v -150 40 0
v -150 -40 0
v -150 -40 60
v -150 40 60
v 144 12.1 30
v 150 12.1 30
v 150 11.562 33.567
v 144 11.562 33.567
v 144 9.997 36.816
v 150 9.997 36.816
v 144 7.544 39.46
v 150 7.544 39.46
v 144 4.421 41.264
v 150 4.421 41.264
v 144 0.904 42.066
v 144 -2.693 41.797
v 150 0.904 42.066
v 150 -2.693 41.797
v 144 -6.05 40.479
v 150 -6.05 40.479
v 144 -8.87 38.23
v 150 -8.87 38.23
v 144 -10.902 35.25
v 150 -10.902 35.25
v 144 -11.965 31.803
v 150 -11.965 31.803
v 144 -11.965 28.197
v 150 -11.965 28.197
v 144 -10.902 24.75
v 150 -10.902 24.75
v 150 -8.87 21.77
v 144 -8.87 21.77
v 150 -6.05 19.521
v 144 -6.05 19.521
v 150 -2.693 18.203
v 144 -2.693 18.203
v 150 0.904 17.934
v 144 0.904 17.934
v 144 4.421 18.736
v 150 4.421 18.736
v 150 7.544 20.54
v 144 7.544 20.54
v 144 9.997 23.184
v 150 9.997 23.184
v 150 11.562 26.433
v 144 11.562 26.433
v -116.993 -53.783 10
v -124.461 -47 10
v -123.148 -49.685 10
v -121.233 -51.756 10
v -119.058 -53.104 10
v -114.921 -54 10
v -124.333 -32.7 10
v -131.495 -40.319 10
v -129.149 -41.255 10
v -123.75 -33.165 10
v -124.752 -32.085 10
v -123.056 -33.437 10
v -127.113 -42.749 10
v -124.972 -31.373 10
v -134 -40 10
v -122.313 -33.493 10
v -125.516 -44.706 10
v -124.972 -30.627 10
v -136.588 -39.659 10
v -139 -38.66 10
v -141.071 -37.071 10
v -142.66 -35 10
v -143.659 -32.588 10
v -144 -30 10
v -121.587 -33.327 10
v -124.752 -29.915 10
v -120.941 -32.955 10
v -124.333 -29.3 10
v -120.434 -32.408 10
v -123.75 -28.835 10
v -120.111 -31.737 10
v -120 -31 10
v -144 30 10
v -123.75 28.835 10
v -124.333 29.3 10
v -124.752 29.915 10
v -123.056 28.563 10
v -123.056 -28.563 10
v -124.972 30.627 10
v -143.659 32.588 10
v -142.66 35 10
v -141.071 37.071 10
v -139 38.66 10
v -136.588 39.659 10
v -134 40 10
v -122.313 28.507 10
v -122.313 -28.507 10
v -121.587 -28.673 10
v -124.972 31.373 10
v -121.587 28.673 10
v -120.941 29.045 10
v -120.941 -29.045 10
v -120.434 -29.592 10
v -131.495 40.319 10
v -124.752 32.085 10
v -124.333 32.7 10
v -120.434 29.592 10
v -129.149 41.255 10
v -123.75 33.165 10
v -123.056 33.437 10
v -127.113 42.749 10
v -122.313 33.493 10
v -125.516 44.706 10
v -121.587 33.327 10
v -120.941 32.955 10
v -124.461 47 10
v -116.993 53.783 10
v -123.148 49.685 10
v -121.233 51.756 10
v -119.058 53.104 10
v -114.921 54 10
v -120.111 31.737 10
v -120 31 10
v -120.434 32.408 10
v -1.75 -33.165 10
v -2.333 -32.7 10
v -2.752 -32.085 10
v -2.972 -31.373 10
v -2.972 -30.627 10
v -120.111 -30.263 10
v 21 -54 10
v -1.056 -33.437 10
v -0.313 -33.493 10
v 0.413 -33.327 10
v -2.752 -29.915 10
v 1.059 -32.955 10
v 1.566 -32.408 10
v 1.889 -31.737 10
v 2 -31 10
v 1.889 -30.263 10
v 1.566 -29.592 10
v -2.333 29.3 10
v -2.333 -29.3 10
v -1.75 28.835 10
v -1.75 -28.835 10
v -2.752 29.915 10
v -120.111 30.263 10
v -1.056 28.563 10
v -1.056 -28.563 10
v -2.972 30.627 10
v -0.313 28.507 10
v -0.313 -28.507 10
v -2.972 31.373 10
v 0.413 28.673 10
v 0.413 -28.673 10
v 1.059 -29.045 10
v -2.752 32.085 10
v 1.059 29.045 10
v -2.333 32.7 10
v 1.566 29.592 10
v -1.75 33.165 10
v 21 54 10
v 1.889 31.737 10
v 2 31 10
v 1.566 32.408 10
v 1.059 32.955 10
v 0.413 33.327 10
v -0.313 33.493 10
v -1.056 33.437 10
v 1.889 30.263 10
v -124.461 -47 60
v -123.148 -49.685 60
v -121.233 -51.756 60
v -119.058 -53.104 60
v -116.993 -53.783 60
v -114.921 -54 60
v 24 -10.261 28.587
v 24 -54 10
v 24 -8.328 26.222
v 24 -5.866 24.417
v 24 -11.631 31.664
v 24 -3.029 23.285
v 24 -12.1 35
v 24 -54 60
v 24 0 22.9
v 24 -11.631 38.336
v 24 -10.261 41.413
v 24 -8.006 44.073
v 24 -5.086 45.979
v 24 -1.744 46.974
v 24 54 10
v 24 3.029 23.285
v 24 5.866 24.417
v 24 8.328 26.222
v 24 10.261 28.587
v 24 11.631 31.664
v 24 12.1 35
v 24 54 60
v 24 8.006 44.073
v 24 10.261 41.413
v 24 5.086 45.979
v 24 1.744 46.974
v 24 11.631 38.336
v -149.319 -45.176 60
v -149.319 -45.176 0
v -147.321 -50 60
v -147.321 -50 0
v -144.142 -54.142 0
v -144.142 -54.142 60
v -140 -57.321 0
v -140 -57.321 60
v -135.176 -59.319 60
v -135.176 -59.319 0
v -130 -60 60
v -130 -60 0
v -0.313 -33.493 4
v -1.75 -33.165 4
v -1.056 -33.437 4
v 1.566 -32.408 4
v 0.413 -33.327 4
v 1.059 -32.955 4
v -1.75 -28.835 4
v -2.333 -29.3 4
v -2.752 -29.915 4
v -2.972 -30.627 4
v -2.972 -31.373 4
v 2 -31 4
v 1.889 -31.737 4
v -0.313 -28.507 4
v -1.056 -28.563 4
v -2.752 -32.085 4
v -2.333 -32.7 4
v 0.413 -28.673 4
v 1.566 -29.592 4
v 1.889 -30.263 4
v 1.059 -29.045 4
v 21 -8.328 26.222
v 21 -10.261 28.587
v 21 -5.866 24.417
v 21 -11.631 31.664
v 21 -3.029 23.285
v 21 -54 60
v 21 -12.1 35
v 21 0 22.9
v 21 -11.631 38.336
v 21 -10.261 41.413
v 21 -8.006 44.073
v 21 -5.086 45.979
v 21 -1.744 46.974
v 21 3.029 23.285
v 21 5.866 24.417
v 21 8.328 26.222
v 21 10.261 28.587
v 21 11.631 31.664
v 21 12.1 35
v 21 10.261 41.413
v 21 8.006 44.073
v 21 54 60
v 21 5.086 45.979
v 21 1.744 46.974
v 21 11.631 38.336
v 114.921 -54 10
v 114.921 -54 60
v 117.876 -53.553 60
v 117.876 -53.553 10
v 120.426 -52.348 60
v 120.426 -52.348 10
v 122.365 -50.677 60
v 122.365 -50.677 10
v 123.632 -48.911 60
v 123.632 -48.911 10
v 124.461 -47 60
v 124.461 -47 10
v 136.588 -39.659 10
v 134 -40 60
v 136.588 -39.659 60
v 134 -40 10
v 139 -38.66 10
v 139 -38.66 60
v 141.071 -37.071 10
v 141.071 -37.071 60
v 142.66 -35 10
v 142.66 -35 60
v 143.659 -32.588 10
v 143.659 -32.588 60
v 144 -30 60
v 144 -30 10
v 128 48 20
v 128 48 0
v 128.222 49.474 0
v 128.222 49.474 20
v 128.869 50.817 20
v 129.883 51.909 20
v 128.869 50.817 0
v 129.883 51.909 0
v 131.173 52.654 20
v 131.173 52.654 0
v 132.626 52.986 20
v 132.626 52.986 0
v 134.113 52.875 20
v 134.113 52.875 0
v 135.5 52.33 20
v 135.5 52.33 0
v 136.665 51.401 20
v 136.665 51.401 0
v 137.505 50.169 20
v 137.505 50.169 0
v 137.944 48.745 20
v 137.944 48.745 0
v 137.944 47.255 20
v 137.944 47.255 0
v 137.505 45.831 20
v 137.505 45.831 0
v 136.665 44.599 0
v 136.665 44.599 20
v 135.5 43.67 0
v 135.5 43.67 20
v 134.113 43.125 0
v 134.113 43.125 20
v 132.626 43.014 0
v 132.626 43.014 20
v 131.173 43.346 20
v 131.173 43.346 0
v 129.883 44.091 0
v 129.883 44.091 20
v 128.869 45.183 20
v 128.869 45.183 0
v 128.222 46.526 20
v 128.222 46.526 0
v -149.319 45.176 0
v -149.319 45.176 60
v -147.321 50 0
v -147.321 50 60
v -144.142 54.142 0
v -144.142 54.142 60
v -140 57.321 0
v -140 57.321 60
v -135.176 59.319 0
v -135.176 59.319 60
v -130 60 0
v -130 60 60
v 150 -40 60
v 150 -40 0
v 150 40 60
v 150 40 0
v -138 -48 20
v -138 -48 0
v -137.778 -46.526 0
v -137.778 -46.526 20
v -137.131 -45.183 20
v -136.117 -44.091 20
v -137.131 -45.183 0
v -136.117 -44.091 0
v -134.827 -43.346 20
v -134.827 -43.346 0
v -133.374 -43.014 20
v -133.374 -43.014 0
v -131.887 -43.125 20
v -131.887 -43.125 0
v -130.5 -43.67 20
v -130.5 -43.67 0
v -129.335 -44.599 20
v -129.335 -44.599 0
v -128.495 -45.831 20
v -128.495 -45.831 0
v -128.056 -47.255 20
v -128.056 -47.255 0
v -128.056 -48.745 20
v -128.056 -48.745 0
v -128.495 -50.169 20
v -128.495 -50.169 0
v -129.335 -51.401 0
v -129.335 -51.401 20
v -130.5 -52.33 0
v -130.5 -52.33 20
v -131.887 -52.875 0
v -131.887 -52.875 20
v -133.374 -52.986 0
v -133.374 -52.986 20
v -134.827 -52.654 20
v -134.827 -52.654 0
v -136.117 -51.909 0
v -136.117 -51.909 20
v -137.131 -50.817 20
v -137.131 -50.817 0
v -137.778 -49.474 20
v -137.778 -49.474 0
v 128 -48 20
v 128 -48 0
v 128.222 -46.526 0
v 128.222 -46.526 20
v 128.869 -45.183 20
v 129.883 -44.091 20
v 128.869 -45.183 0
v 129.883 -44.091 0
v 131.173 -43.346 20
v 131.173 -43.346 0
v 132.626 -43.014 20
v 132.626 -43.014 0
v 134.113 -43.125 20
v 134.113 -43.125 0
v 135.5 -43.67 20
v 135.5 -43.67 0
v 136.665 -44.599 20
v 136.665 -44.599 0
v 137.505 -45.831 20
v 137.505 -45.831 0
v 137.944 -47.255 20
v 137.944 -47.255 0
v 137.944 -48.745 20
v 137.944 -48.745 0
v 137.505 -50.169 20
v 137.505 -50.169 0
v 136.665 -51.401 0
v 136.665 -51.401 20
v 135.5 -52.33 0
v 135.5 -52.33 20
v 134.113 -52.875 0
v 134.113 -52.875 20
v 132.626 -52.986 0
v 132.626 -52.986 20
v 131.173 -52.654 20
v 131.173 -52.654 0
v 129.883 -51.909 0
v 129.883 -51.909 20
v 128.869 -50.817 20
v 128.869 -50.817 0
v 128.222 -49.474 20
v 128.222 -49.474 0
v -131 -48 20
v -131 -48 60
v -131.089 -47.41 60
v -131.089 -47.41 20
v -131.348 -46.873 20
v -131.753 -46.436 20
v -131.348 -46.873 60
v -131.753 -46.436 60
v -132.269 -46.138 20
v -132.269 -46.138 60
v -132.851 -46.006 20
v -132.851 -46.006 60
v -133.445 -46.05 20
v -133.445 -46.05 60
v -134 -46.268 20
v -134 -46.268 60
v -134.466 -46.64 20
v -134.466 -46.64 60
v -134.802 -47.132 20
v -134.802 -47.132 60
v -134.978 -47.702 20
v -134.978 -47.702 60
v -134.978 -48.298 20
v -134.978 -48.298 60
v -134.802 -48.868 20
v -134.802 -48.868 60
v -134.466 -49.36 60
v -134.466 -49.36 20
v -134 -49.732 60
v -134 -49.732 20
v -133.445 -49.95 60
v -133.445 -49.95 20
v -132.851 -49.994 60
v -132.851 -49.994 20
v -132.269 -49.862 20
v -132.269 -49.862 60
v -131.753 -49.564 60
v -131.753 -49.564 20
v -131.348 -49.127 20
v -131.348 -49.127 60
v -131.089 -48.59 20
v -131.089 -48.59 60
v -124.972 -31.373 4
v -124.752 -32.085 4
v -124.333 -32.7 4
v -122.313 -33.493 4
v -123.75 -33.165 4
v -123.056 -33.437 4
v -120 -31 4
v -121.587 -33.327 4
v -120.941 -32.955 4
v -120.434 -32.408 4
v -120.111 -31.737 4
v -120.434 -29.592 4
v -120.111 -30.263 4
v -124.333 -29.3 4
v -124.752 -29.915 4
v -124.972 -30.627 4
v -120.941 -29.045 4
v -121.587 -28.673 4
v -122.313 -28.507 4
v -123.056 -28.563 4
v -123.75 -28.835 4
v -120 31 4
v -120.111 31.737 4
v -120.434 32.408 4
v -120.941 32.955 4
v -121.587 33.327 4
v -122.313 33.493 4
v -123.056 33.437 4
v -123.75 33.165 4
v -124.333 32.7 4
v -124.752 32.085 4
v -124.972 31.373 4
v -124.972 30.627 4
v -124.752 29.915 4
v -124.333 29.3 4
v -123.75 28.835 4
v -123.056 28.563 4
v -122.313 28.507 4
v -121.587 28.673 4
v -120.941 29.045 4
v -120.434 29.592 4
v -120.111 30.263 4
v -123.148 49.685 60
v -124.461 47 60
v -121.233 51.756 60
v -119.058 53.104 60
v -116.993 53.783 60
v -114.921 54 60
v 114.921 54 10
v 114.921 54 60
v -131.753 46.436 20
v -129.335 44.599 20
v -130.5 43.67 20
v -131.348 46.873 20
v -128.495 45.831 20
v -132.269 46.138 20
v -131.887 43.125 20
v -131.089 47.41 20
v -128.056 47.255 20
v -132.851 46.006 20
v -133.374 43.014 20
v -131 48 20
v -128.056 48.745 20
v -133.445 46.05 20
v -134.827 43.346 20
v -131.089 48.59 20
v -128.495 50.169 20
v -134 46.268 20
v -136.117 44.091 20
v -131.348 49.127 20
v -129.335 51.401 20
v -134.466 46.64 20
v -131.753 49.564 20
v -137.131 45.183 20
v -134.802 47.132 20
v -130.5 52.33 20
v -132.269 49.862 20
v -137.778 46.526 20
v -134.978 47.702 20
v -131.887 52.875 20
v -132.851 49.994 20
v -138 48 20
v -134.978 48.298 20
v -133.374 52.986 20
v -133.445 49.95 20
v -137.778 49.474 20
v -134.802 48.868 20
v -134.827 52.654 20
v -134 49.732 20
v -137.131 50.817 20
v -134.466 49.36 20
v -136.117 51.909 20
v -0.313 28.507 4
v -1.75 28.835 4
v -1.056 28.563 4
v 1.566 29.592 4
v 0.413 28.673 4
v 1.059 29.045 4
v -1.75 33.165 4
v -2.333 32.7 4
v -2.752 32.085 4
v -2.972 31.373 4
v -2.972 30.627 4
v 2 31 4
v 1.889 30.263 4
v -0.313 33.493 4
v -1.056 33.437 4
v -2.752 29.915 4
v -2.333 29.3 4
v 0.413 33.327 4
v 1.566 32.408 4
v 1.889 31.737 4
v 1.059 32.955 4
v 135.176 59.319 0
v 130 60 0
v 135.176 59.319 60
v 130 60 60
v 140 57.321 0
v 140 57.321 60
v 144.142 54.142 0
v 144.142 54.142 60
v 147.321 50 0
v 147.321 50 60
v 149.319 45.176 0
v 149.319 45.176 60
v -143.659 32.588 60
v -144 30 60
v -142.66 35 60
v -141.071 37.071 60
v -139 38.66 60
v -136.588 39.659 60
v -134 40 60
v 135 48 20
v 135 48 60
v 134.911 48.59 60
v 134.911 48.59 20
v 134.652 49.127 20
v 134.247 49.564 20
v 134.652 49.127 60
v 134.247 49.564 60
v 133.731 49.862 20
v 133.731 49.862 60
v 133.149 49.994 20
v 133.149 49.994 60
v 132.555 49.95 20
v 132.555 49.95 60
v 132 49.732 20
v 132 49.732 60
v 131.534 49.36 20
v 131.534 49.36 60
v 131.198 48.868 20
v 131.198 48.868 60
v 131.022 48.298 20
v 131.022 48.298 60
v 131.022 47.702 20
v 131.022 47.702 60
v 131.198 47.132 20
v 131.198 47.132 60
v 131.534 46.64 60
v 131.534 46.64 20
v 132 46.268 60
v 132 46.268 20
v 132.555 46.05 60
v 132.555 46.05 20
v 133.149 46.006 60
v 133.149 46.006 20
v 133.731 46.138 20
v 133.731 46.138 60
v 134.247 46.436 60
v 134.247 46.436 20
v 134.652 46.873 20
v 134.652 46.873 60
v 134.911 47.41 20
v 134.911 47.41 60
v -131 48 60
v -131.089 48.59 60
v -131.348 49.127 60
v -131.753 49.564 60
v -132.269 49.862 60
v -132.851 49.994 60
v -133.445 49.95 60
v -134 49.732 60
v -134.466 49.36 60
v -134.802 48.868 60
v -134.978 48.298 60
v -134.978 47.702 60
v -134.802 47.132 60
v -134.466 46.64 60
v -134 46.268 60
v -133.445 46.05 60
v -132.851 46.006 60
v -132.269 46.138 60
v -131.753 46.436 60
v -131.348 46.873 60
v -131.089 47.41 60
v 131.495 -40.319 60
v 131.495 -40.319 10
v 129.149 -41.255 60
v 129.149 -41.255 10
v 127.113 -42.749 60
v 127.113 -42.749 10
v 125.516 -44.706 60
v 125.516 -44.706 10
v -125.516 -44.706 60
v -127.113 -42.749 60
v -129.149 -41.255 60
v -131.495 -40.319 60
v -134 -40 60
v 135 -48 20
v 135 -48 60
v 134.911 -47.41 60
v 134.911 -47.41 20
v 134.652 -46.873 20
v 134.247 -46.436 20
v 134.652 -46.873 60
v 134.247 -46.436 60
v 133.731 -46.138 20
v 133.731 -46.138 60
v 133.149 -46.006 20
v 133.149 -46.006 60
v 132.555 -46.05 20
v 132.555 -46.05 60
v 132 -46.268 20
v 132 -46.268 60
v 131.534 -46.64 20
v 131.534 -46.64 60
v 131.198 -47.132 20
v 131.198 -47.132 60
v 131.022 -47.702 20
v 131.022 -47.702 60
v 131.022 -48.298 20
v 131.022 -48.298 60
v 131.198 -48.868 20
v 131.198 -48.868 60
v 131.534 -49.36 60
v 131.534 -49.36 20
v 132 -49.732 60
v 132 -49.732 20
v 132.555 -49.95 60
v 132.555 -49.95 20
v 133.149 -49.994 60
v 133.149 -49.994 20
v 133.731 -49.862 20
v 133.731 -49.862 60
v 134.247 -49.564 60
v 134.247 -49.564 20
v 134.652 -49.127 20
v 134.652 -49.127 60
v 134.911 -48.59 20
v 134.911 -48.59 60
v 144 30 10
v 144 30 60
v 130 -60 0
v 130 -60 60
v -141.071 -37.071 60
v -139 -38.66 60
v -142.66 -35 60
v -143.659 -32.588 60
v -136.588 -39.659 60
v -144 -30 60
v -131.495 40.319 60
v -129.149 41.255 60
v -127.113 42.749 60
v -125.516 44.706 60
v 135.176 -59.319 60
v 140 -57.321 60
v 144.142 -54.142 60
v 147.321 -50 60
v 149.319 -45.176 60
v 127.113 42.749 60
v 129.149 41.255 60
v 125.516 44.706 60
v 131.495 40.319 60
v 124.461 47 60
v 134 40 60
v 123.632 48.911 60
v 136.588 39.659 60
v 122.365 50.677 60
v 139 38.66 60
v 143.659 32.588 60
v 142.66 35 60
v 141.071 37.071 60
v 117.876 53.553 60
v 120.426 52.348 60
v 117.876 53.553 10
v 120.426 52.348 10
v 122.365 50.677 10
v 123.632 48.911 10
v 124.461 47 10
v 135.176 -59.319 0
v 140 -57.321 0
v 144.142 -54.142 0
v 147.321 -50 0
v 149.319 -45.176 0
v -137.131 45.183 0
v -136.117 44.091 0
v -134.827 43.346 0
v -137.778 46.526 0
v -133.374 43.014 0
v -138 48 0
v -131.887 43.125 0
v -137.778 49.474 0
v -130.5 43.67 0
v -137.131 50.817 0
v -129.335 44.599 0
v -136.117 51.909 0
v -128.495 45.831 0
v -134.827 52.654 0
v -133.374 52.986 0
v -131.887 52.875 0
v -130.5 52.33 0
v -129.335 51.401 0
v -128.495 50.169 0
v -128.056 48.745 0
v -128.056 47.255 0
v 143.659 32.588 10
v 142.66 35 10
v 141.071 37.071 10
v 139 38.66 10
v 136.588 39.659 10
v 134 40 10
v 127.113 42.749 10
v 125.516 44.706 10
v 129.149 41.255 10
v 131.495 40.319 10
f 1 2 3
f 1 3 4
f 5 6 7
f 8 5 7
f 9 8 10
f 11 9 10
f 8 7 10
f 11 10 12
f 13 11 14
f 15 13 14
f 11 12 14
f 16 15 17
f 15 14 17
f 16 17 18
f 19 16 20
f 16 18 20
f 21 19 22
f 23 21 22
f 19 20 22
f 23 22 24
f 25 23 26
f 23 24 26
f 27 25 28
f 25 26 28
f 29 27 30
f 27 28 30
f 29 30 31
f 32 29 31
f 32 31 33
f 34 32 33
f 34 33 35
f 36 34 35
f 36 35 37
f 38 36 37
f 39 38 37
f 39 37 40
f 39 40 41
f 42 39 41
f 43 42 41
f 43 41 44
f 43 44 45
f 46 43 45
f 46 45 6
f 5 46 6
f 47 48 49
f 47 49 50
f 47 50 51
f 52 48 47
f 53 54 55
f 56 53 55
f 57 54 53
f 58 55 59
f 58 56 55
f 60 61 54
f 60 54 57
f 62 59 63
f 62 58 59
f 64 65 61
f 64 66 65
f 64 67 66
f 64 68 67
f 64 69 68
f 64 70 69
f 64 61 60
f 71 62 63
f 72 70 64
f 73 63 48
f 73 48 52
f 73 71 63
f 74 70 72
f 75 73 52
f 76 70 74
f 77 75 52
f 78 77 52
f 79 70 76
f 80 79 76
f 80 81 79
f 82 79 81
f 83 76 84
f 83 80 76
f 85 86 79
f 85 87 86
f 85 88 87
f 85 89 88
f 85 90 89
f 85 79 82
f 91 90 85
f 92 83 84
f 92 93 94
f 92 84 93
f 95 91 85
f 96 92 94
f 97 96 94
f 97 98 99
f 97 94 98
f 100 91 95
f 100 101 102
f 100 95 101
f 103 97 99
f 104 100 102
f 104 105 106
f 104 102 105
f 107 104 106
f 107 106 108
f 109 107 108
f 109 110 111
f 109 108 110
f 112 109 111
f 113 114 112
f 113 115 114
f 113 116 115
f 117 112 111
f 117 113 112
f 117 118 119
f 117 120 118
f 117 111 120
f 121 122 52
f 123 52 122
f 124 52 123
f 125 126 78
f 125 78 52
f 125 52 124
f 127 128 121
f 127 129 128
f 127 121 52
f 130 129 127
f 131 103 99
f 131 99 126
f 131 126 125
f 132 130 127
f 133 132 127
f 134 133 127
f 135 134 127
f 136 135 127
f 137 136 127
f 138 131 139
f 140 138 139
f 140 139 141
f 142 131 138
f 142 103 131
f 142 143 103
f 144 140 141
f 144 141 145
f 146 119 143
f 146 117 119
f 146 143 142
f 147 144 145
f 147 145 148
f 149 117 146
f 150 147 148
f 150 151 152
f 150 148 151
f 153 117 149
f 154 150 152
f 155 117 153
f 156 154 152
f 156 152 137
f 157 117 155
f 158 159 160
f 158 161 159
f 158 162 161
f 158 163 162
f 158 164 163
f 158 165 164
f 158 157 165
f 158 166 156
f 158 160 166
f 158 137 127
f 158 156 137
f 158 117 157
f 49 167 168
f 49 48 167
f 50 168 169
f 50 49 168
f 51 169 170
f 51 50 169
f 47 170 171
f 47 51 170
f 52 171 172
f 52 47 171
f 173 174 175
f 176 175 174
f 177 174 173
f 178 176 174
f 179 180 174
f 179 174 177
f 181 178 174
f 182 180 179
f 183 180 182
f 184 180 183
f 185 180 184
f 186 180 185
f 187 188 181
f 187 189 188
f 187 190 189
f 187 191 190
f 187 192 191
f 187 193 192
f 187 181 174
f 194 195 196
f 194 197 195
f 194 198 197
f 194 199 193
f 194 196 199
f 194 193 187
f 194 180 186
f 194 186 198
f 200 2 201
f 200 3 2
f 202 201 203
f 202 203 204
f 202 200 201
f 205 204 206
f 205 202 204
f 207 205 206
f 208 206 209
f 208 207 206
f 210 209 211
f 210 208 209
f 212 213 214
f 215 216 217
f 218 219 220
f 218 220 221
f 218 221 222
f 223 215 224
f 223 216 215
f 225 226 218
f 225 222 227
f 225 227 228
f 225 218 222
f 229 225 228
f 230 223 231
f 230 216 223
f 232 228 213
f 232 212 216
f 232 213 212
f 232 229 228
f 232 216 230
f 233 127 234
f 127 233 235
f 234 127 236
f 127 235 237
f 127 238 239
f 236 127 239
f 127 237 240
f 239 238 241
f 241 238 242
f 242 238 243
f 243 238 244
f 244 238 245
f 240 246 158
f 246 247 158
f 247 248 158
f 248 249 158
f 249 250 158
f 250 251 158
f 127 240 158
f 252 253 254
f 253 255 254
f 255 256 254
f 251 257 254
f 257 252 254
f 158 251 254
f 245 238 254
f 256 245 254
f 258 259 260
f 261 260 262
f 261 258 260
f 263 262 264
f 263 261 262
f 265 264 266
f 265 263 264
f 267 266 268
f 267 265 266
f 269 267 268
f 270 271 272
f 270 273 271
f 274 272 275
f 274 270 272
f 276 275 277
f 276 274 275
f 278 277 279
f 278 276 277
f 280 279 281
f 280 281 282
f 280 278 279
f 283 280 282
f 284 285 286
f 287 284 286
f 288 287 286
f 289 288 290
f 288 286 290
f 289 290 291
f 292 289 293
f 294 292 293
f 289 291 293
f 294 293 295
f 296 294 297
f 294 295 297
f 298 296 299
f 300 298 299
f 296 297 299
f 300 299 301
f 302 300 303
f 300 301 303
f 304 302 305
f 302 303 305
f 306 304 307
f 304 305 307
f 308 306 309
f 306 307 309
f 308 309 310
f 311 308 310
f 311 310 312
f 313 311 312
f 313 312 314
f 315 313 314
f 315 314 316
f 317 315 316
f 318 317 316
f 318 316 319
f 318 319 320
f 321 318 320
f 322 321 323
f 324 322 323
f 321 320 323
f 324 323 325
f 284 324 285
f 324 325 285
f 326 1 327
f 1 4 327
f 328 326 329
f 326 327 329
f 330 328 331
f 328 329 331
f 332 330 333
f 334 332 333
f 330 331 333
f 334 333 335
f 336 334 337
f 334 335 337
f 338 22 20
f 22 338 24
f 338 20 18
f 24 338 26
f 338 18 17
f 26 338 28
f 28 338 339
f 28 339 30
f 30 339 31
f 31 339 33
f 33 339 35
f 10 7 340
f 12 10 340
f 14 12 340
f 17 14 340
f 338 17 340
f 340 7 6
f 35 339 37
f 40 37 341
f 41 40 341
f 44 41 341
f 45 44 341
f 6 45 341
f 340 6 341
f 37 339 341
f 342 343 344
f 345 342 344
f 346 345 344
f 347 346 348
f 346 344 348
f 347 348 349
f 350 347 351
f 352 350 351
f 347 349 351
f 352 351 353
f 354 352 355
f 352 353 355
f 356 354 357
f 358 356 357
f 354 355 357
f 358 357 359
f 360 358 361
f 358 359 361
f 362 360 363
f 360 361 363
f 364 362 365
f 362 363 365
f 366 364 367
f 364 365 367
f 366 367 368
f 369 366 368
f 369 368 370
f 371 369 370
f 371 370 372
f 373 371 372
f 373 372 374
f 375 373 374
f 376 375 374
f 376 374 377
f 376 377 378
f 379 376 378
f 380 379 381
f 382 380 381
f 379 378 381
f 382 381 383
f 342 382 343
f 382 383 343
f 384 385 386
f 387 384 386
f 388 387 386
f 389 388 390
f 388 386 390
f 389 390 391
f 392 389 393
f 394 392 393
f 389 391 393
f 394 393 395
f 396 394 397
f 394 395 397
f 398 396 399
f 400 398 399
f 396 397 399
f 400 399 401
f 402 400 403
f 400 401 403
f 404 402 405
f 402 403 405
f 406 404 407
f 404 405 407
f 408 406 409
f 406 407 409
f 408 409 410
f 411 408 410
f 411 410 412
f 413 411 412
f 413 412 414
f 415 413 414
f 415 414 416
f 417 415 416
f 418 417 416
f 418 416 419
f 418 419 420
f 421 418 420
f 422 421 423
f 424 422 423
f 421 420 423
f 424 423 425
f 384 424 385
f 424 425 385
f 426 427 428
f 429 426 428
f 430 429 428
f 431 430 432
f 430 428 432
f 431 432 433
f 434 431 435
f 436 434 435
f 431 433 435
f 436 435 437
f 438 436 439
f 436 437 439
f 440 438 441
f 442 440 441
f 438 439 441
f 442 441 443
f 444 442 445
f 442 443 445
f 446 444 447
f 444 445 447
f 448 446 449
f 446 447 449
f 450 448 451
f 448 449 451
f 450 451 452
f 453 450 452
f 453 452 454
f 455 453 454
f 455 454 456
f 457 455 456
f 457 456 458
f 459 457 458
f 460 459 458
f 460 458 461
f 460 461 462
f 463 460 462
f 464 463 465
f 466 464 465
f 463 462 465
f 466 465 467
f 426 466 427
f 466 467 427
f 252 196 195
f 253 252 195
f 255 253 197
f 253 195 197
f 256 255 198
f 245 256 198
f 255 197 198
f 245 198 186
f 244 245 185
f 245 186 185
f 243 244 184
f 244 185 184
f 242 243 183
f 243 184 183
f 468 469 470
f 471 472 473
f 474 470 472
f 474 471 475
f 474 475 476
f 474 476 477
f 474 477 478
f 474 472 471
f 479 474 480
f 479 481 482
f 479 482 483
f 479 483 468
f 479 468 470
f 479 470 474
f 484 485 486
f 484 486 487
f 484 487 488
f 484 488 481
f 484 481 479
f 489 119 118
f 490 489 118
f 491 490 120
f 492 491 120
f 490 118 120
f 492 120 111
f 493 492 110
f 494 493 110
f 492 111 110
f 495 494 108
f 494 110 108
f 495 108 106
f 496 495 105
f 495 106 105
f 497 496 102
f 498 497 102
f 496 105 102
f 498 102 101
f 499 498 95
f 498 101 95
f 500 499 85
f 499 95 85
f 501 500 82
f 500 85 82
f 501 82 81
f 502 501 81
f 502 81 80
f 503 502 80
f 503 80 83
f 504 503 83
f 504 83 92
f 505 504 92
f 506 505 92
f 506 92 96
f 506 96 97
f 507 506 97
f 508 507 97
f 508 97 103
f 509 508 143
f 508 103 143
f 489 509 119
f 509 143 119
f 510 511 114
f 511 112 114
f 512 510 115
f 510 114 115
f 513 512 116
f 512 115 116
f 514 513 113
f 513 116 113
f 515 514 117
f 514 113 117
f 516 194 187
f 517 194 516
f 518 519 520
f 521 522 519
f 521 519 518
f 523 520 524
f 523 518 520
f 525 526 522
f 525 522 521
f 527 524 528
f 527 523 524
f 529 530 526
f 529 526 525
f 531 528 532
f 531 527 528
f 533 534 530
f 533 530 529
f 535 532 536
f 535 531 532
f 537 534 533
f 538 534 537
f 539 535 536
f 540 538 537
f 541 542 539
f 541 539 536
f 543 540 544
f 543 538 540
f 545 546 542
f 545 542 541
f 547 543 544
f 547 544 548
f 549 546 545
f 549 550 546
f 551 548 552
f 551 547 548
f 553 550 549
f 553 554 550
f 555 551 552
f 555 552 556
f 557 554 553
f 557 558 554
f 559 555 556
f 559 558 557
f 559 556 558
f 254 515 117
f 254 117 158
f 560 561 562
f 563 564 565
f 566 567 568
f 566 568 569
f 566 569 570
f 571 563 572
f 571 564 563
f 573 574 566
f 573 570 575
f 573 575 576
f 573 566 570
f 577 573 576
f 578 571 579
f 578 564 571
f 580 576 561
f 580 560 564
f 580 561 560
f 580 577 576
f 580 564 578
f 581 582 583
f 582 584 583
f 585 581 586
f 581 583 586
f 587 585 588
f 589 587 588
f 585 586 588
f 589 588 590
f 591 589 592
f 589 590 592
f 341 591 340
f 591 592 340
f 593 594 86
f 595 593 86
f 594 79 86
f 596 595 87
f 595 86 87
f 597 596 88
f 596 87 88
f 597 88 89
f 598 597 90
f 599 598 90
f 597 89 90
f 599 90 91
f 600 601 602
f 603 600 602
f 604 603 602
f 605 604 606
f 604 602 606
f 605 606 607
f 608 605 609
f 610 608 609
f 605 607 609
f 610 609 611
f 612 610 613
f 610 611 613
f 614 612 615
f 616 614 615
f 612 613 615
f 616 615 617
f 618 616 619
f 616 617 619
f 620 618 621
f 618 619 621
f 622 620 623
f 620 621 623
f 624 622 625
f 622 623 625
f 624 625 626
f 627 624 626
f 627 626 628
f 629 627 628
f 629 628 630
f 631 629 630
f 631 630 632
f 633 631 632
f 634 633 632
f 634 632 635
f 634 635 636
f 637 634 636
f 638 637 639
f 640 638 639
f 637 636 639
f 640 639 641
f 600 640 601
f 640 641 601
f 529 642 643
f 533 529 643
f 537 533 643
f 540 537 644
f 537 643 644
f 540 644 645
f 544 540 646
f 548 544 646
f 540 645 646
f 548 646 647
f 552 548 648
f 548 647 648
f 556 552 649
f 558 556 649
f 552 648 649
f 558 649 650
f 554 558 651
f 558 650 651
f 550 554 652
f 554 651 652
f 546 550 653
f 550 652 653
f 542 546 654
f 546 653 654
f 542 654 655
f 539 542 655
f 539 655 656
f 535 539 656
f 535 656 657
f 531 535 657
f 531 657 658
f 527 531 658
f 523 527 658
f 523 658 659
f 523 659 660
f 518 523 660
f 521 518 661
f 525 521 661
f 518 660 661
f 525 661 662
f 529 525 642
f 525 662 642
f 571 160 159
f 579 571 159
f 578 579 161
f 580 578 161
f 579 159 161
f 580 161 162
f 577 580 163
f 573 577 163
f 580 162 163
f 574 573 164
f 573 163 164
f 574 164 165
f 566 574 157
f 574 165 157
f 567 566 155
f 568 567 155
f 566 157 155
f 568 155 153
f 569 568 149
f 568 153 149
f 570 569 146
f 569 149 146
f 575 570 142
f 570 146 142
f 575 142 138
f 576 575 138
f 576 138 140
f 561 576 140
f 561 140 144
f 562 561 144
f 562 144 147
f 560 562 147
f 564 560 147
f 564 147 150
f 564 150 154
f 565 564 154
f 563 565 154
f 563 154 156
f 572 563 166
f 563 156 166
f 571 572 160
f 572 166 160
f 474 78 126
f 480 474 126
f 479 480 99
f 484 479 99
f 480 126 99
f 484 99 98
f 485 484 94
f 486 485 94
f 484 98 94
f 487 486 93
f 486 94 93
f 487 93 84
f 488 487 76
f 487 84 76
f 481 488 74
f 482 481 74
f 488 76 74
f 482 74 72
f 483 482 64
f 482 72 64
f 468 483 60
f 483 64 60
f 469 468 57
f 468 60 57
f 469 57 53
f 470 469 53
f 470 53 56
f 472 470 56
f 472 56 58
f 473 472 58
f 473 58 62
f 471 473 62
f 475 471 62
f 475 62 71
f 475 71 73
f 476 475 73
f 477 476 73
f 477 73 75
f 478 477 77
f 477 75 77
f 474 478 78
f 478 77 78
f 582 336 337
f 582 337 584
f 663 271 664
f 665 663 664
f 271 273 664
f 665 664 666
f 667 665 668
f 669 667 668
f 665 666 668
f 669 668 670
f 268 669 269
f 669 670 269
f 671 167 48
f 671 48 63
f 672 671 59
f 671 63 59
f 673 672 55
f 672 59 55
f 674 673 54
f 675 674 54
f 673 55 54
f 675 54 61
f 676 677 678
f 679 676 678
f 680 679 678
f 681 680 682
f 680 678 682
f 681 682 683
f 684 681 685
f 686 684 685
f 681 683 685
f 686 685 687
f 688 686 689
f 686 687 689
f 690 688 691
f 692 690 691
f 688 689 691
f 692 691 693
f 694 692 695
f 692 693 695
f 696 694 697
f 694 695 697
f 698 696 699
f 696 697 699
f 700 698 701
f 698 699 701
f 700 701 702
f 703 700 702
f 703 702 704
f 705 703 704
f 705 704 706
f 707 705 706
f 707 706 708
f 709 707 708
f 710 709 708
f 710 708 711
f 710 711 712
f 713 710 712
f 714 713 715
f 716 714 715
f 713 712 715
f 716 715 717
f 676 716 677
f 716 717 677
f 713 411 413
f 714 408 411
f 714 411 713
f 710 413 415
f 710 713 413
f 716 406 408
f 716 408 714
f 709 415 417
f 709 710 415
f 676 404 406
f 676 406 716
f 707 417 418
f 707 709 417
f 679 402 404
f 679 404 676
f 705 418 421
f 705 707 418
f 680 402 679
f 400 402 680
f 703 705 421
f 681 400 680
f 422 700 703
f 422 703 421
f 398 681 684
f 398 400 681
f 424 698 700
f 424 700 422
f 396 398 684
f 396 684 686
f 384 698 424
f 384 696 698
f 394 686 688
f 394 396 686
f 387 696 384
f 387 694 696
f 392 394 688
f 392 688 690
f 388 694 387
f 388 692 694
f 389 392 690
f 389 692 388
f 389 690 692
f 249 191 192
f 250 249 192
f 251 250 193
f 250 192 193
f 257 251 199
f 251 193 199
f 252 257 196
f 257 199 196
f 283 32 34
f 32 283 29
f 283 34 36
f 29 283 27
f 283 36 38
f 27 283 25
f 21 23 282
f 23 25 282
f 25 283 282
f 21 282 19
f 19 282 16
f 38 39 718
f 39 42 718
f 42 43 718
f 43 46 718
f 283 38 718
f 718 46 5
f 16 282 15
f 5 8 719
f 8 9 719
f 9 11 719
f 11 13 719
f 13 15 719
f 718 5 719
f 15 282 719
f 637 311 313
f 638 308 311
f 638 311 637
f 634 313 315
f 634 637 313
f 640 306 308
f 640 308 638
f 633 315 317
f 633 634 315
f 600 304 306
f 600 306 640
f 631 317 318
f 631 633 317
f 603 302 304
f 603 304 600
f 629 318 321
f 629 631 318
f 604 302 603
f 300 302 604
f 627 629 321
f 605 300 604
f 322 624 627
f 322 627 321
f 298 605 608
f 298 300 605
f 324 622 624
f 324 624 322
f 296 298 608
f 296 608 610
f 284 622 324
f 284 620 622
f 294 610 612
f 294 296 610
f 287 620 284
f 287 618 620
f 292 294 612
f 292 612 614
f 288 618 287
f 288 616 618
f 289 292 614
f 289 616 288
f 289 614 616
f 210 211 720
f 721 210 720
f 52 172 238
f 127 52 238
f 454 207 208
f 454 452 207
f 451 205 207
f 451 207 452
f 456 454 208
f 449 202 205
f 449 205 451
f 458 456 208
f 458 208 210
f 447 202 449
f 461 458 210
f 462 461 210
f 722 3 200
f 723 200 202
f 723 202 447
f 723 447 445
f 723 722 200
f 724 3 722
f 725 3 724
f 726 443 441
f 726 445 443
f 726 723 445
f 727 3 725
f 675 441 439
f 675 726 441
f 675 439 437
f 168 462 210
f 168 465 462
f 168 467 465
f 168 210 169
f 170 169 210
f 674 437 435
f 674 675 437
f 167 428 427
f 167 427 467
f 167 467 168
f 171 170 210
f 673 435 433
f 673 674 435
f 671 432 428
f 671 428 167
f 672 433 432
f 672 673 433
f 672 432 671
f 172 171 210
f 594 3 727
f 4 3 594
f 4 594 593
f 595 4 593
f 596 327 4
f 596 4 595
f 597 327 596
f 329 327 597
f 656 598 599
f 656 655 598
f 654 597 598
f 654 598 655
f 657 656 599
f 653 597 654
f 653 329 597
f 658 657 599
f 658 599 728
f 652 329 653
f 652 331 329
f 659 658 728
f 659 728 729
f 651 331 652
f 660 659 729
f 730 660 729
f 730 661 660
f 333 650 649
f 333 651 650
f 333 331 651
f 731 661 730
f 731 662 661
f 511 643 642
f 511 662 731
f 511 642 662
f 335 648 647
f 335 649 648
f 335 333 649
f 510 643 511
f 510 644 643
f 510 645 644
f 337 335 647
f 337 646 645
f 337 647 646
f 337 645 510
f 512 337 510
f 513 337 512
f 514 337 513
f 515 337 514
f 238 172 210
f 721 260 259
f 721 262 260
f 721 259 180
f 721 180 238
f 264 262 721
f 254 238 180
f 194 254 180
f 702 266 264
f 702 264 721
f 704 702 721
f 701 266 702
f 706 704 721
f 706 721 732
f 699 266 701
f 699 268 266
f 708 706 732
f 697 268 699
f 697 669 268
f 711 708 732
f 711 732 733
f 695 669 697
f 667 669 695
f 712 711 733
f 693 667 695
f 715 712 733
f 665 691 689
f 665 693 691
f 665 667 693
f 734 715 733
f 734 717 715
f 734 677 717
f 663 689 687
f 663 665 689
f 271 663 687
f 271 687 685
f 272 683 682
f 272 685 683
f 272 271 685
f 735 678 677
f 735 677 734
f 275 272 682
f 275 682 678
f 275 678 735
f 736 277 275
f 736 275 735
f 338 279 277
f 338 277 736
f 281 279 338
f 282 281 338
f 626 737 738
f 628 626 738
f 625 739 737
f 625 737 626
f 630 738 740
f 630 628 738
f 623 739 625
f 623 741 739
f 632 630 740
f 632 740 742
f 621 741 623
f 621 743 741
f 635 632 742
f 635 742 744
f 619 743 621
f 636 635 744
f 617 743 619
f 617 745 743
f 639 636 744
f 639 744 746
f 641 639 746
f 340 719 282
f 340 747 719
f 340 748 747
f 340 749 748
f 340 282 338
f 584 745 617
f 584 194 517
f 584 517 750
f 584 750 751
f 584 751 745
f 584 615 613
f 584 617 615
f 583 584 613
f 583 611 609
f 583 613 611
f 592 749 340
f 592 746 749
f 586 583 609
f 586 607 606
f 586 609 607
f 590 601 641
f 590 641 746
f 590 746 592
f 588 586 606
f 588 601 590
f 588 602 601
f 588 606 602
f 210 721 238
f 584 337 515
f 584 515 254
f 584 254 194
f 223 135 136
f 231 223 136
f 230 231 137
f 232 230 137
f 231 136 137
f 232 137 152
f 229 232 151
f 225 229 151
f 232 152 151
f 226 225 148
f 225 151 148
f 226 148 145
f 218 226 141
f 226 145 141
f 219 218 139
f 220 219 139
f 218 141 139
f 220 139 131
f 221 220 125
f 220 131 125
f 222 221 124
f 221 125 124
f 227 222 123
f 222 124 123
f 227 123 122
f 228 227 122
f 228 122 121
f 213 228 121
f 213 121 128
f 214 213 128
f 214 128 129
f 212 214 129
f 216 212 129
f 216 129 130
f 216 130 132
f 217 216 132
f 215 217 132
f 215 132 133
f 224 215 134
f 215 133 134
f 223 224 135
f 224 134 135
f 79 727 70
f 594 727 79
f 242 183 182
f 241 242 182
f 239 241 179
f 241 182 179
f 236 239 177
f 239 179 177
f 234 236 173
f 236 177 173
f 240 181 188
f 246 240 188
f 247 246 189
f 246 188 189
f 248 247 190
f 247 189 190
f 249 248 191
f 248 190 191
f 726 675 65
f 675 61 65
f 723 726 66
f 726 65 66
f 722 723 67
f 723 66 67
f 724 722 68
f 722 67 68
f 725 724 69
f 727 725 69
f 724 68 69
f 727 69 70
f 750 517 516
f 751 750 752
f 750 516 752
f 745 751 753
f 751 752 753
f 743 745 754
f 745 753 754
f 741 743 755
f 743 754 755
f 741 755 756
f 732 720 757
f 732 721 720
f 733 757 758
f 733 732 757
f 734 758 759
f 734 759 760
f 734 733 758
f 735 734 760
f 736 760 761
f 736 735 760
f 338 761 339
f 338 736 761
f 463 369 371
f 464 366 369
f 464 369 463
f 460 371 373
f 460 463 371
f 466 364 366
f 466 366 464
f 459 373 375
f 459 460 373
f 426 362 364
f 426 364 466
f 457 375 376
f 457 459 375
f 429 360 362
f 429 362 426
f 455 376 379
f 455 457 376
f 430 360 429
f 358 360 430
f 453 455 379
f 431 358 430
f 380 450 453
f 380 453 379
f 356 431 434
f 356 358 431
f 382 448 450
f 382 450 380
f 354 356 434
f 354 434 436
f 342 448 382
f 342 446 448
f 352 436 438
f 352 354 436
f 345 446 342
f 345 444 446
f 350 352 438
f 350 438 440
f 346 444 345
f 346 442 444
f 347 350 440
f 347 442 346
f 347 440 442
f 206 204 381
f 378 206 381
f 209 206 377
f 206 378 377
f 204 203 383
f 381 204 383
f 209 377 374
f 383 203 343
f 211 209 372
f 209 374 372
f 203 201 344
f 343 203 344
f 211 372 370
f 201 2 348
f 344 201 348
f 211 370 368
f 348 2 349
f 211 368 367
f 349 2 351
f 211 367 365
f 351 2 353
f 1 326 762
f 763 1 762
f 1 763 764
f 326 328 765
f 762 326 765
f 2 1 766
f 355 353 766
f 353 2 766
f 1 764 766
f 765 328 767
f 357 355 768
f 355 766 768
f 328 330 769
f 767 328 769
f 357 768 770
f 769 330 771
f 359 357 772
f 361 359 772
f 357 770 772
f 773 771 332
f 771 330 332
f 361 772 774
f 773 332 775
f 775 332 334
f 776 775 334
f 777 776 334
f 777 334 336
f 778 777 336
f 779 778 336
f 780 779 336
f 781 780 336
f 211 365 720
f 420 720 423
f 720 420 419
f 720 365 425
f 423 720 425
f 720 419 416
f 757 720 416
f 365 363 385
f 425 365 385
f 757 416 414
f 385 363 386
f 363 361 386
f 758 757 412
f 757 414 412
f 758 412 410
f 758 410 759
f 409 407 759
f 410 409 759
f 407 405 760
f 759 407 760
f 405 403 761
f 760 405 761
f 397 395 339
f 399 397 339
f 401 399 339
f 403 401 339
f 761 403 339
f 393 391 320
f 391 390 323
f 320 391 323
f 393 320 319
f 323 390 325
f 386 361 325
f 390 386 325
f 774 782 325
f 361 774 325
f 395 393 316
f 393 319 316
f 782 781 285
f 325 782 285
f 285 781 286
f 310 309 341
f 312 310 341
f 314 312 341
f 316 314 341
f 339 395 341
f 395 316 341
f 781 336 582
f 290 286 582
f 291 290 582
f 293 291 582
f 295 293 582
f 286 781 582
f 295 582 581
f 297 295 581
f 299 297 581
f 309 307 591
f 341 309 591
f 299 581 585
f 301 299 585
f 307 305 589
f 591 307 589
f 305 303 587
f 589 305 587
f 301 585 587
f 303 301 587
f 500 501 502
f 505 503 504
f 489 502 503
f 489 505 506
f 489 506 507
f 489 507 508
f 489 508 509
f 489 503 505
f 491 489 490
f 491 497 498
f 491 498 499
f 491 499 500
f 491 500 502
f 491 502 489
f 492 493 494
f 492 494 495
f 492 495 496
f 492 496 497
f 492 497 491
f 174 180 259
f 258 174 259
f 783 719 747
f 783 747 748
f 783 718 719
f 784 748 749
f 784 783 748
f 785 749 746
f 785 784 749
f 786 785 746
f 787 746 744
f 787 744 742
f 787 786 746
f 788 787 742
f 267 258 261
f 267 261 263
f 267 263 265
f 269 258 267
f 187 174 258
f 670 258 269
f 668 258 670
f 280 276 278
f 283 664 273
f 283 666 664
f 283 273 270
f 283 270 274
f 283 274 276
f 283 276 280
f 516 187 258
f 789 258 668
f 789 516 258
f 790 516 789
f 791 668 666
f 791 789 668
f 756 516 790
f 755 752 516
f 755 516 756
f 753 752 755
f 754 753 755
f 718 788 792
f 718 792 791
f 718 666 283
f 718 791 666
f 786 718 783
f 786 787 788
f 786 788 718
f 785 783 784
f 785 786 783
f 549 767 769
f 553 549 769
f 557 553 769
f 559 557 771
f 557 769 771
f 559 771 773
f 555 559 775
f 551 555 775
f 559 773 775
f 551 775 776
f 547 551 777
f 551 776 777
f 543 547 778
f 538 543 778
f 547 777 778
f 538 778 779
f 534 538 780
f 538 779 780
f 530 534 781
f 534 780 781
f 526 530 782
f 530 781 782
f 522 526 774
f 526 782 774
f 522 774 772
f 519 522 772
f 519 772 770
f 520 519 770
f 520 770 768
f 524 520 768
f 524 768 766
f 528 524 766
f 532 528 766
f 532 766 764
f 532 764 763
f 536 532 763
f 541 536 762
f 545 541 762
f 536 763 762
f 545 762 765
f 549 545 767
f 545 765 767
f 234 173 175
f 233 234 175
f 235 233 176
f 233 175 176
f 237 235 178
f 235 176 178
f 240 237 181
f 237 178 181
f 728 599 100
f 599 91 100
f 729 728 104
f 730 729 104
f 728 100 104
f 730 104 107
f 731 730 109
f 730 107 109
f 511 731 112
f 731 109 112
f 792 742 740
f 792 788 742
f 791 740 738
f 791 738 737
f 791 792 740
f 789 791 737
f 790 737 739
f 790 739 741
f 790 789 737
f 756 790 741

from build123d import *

# Parameters (mm, degrees)
SKETCH_1_W           = 300
SKETCH_1_H           = 120
EXTRUDE_2_DEPTH      = 60
SKETCH_2_W           = 120
SKETCH_2_H           = 80
SKETCH_2_W_2         = 165
CUT_EXTRUDE_1_DEPTH  = 50
FILLET_5_R           = 20
SKETCH_2_5_R         = 2
CUT_EXTRUDE_5_DEPTH  = 40
CUT_EXTRUDE_4_REACH  = 313.769
SKETCH_10_R          = 12.1
SKETCH_13_R          = 5
CUT_EXTRUDE_7_DEPTH  = 20
CUT_EXTRUDE_8_REACH  = 195.587
SKETCH_16_R          = 2.5
CUT_EXTRUDE_9_DEPTH  = 6
SKETCH_2_7_W         = 100
SKETCH_2_7_H         = 14
SKETCH_2_7_W_2       = 145
CUT_EXTRUDE_10_DEPTH = 50
FILLET_6_R           = 10
FILLET_7_R           = 10
FILLET_8_R           = 10
FILLET_9_R           = 10
FILLET_10_R          = 10
FILLET_11_R          = 10
FILLET_12_R          = 10
FILLET_14_R          = 10
FILLET_15_R          = 10
FILLET_16_R          = 10


with BuildPart() as part:
    # Эскиз1 → Бобышка-Вытянуть2 (new body)
    with BuildSketch(Plane.XY):
        Rectangle(SKETCH_1_W, SKETCH_1_H)
    extrude(amount=EXTRUDE_2_DEPTH)

    # Эскиз2 → Вырез-Вытянуть1 (cut)
    with BuildSketch(Plane.XY.offset(60)):
        with Locations((84, 0)):
            Rectangle(SKETCH_2_W, SKETCH_2_H)
        with Locations((-61.5, 0)):
            Rectangle(SKETCH_2_W_2, SKETCH_2_H)
    extrude(amount=-CUT_EXTRUDE_1_DEPTH, mode=Mode.SUBTRACT)

    # Скругление5
    fillet_5_edges = [part.edges().sort_by_distance(p)[0] for p in [
        (150, -60, 30),
        (150, 60, 30),
        (-150, 60, 30),
        (-150, -60, 30),
    ]]
    fillet(fillet_5_edges, radius=FILLET_5_R)

    # Эскиз2<5> → Вырез-Вытянуть5 (cut)
    with BuildSketch(Plane.XY.offset(60)):
        with Locations((133, 48)):
            Circle(SKETCH_2_5_R)
        with Locations((133, -48)):
            Circle(SKETCH_2_5_R)
        with Locations((-133, 48)):
            Circle(SKETCH_2_5_R)
        with Locations((-133, -48)):
            Circle(SKETCH_2_5_R)
    extrude(amount=-CUT_EXTRUDE_5_DEPTH, mode=Mode.SUBTRACT)

    # Эскиз10 → Вырез-Вытянуть4 (cut, up to next)
    with BuildSketch(Plane(origin=(150, 0, 0), x_dir=(0, 0, -1), z_dir=(1, 0, 0)), mode=Mode.PRIVATE) as cut_extrude_4_sk1:
        with Locations(Location((-30, 0, 0), (0, 0, 90))):
            Circle(SKETCH_10_R)
    cut_extrude_4_tool1 = extrude(cut_extrude_4_sk1.sketch, amount=-CUT_EXTRUDE_4_REACH, mode=Mode.PRIVATE) & part.part
    add(cut_extrude_4_tool1.solids().sort_by_distance((150, 0, 30))[0], mode=Mode.SUBTRACT)

    # Эскиз13 → Вырез-Вытянуть7 (cut)
    with BuildSketch(Plane(origin=(0, 0, 0), x_dir=(-1, 0, 0), z_dir=(0, 0, -1))):
        with Locations((-133, 48)):
            Circle(SKETCH_13_R)
        with Locations((-133, -48)):
            Circle(SKETCH_13_R)
        with Locations((133, -48)):
            Circle(SKETCH_13_R)
        with Locations((133, 48)):
            Circle(SKETCH_13_R)
    extrude(amount=-CUT_EXTRUDE_7_DEPTH, mode=Mode.SUBTRACT)

    # Эскиз14 → Вырез-Вытянуть8 (cut, up to next)
    with BuildSketch(Plane(origin=(24, 0, 0), x_dir=(0, 0, -1), z_dir=(1, 0, 0)), mode=Mode.PRIVATE) as cut_extrude_8_sk1:
        with BuildLine():
            ThreePointArc((-28.587012826, 10.260779478), (-35, 12.1), (-41.412987174, 10.260779478))
            Line((-41.412987174, 10.260779478), (-35, 0))
            Line((-35, 0), (-28.587012826, 10.260779478))
        make_face()
    cut_extrude_8_tool1 = extrude(cut_extrude_8_sk1.sketch, amount=-CUT_EXTRUDE_8_REACH, mode=Mode.PRIVATE) & part.part
    # Эскиз14 → Вырез-Вытянуть8 (cut, up to next)
    with BuildSketch(Plane(origin=(24, 0, 0), x_dir=(0, 0, -1), z_dir=(1, 0, 0)), mode=Mode.PRIVATE) as cut_extrude_8_sk2:
        with BuildLine():
            Line((-35, 0), (-41.412987174, 10.260779478))
            ThreePointArc((-41.412987174, 10.260779478), (-47.1, 0), (-41.412987174, -10.260779478))
            Line((-41.412987174, -10.260779478), (-35, 0))
        make_face()
    cut_extrude_8_tool2 = extrude(cut_extrude_8_sk2.sketch, amount=-CUT_EXTRUDE_8_REACH, mode=Mode.PRIVATE) & part.part
    # Эскиз14 → Вырез-Вытянуть8 (cut, up to next)
    with BuildSketch(Plane(origin=(24, 0, 0), x_dir=(0, 0, -1), z_dir=(1, 0, 0)), mode=Mode.PRIVATE) as cut_extrude_8_sk3:
        with BuildLine():
            Line((-28.587012826, 10.260779478), (-35, 0))
            Line((-35, 0), (-28.587012826, -10.260779478))
            ThreePointArc((-28.587012826, -10.260779478), (-24.416825977, -5.865699242), (-22.9, 0))
            ThreePointArc((-22.9, 0), (-24.416825977, 5.865699242), (-28.587012826, 10.260779478))
        make_face()
    cut_extrude_8_tool3 = extrude(cut_extrude_8_sk3.sketch, amount=-CUT_EXTRUDE_8_REACH, mode=Mode.PRIVATE) & part.part
    # Эскиз14 → Вырез-Вытянуть8 (cut, up to next)
    with BuildSketch(Plane(origin=(24, 0, 0), x_dir=(0, 0, -1), z_dir=(1, 0, 0)), mode=Mode.PRIVATE) as cut_extrude_8_sk4:
        with BuildLine():
            Line((-28.587012826, -10.260779478), (-35, 0))
            Line((-35, 0), (-41.412987174, -10.260779478))
            ThreePointArc((-41.412987174, -10.260779478), (-35, -12.1), (-28.587012826, -10.260779478))
        make_face()
    cut_extrude_8_tool4 = extrude(cut_extrude_8_sk4.sketch, amount=-CUT_EXTRUDE_8_REACH, mode=Mode.PRIVATE) & part.part
    # Эскиз14 → Вырез-Вытянуть8 (cut, up to next)
    with BuildSketch(Plane(origin=(24, 0, 0), x_dir=(0, 0, -1), z_dir=(1, 0, 0)), mode=Mode.PRIVATE) as cut_extrude_8_sk5:
        with BuildLine():
            ThreePointArc((-28.587012826, 10.260779478), (-35, 12.1), (-41.412987174, 10.260779478))
            Line((-41.412987174, 10.260779478), (-35, 0))
            Line((-35, 0), (-28.587012826, 10.260779478))
        make_face()
    cut_extrude_8_tool5 = extrude(cut_extrude_8_sk5.sketch, amount=-CUT_EXTRUDE_8_REACH, mode=Mode.PRIVATE) & part.part
    # Эскиз14 → Вырез-Вытянуть8 (cut, up to next)
    with BuildSketch(Plane(origin=(24, 0, 0), x_dir=(0, 0, -1), z_dir=(1, 0, 0)), mode=Mode.PRIVATE) as cut_extrude_8_sk6:
        with BuildLine():
            Line((-35, 0), (-41.412987174, 10.260779478))
            ThreePointArc((-41.412987174, 10.260779478), (-47.1, 0), (-41.412987174, -10.260779478))
            Line((-41.412987174, -10.260779478), (-35, 0))
        make_face()
    cut_extrude_8_tool6 = extrude(cut_extrude_8_sk6.sketch, amount=-CUT_EXTRUDE_8_REACH, mode=Mode.PRIVATE) & part.part
    # Эскиз14 → Вырез-Вытянуть8 (cut, up to next)
    with BuildSketch(Plane(origin=(24, 0, 0), x_dir=(0, 0, -1), z_dir=(1, 0, 0)), mode=Mode.PRIVATE) as cut_extrude_8_sk7:
        with BuildLine():
            Line((-28.587012826, 10.260779478), (-35, 0))
            Line((-35, 0), (-28.587012826, -10.260779478))
            ThreePointArc((-28.587012826, -10.260779478), (-24.416825977, -5.865699242), (-22.9, 0))
            ThreePointArc((-22.9, 0), (-24.416825977, 5.865699242), (-28.587012826, 10.260779478))
        make_face()
    cut_extrude_8_tool7 = extrude(cut_extrude_8_sk7.sketch, amount=-CUT_EXTRUDE_8_REACH, mode=Mode.PRIVATE) & part.part
    # Эскиз14 → Вырез-Вытянуть8 (cut, up to next)
    with BuildSketch(Plane(origin=(24, 0, 0), x_dir=(0, 0, -1), z_dir=(1, 0, 0)), mode=Mode.PRIVATE) as cut_extrude_8_sk8:
        with BuildLine():
            Line((-28.587012826, -10.260779478), (-35, 0))
            Line((-35, 0), (-41.412987174, -10.260779478))
            ThreePointArc((-41.412987174, -10.260779478), (-35, -12.1), (-28.587012826, -10.260779478))
        make_face()
    cut_extrude_8_tool8 = extrude(cut_extrude_8_sk8.sketch, amount=-CUT_EXTRUDE_8_REACH, mode=Mode.PRIVATE) & part.part
    # Эскиз14 → Вырез-Вытянуть8 (cut, up to next)
    with BuildSketch(Plane(origin=(24, 0, 0), x_dir=(0, 0, -1), z_dir=(1, 0, 0)), mode=Mode.PRIVATE) as cut_extrude_8_sk9:
        with BuildLine():
            ThreePointArc((-28.587012826, 10.260779478), (-35, 12.1), (-41.412987174, 10.260779478))
            Line((-41.412987174, 10.260779478), (-35, 0))
            Line((-35, 0), (-28.587012826, 10.260779478))
        make_face()
    cut_extrude_8_tool9 = extrude(cut_extrude_8_sk9.sketch, amount=-CUT_EXTRUDE_8_REACH, mode=Mode.PRIVATE) & part.part
    # Эскиз14 → Вырез-Вытянуть8 (cut, up to next)
    with BuildSketch(Plane(origin=(24, 0, 0), x_dir=(0, 0, -1), z_dir=(1, 0, 0)), mode=Mode.PRIVATE) as cut_extrude_8_sk10:
        with BuildLine():
            Line((-35, 0), (-41.412987174, 10.260779478))
            ThreePointArc((-41.412987174, 10.260779478), (-47.1, 0), (-41.412987174, -10.260779478))
            Line((-41.412987174, -10.260779478), (-35, 0))
        make_face()
    cut_extrude_8_tool10 = extrude(cut_extrude_8_sk10.sketch, amount=-CUT_EXTRUDE_8_REACH, mode=Mode.PRIVATE) & part.part
    # Эскиз14 → Вырез-Вытянуть8 (cut, up to next)
    with BuildSketch(Plane(origin=(24, 0, 0), x_dir=(0, 0, -1), z_dir=(1, 0, 0)), mode=Mode.PRIVATE) as cut_extrude_8_sk11:
        with BuildLine():
            Line((-28.587012826, 10.260779478), (-35, 0))
            Line((-35, 0), (-28.587012826, -10.260779478))
            ThreePointArc((-28.587012826, -10.260779478), (-24.416825977, -5.865699242), (-22.9, 0))
            ThreePointArc((-22.9, 0), (-24.416825977, 5.865699242), (-28.587012826, 10.260779478))
        make_face()
    cut_extrude_8_tool11 = extrude(cut_extrude_8_sk11.sketch, amount=-CUT_EXTRUDE_8_REACH, mode=Mode.PRIVATE) & part.part
    # Эскиз14 → Вырез-Вытянуть8 (cut, up to next)
    with BuildSketch(Plane(origin=(24, 0, 0), x_dir=(0, 0, -1), z_dir=(1, 0, 0)), mode=Mode.PRIVATE) as cut_extrude_8_sk12:
        with BuildLine():
            Line((-28.587012826, -10.260779478), (-35, 0))
            Line((-35, 0), (-41.412987174, -10.260779478))
            ThreePointArc((-41.412987174, -10.260779478), (-35, -12.1), (-28.587012826, -10.260779478))
        make_face()
    cut_extrude_8_tool12 = extrude(cut_extrude_8_sk12.sketch, amount=-CUT_EXTRUDE_8_REACH, mode=Mode.PRIVATE) & part.part
    # Эскиз14 → Вырез-Вытянуть8 (cut, up to next)
    with BuildSketch(Plane(origin=(24, 0, 0), x_dir=(0, 0, -1), z_dir=(1, 0, 0)), mode=Mode.PRIVATE) as cut_extrude_8_sk13:
        with BuildLine():
            ThreePointArc((-28.587012826, 10.260779478), (-35, 12.1), (-41.412987174, 10.260779478))
            Line((-41.412987174, 10.260779478), (-35, 0))
            Line((-35, 0), (-28.587012826, 10.260779478))
        make_face()
    cut_extrude_8_tool13 = extrude(cut_extrude_8_sk13.sketch, amount=-CUT_EXTRUDE_8_REACH, mode=Mode.PRIVATE) & part.part
    # Эскиз14 → Вырез-Вытянуть8 (cut, up to next)
    with BuildSketch(Plane(origin=(24, 0, 0), x_dir=(0, 0, -1), z_dir=(1, 0, 0)), mode=Mode.PRIVATE) as cut_extrude_8_sk14:
        with BuildLine():
            Line((-35, 0), (-41.412987174, 10.260779478))
            ThreePointArc((-41.412987174, 10.260779478), (-47.1, 0), (-41.412987174, -10.260779478))
            Line((-41.412987174, -10.260779478), (-35, 0))
        make_face()
    cut_extrude_8_tool14 = extrude(cut_extrude_8_sk14.sketch, amount=-CUT_EXTRUDE_8_REACH, mode=Mode.PRIVATE) & part.part
    # Эскиз14 → Вырез-Вытянуть8 (cut, up to next)
    with BuildSketch(Plane(origin=(24, 0, 0), x_dir=(0, 0, -1), z_dir=(1, 0, 0)), mode=Mode.PRIVATE) as cut_extrude_8_sk15:
        with BuildLine():
            Line((-28.587012826, 10.260779478), (-35, 0))
            Line((-35, 0), (-28.587012826, -10.260779478))
            ThreePointArc((-28.587012826, -10.260779478), (-24.416825977, -5.865699242), (-22.9, 0))
            ThreePointArc((-22.9, 0), (-24.416825977, 5.865699242), (-28.587012826, 10.260779478))
        make_face()
    cut_extrude_8_tool15 = extrude(cut_extrude_8_sk15.sketch, amount=-CUT_EXTRUDE_8_REACH, mode=Mode.PRIVATE) & part.part
    # Эскиз14 → Вырез-Вытянуть8 (cut, up to next)
    with BuildSketch(Plane(origin=(24, 0, 0), x_dir=(0, 0, -1), z_dir=(1, 0, 0)), mode=Mode.PRIVATE) as cut_extrude_8_sk16:
        with BuildLine():
            Line((-28.587012826, -10.260779478), (-35, 0))
            Line((-35, 0), (-41.412987174, -10.260779478))
            ThreePointArc((-41.412987174, -10.260779478), (-35, -12.1), (-28.587012826, -10.260779478))
        make_face()
    cut_extrude_8_tool16 = extrude(cut_extrude_8_sk16.sketch, amount=-CUT_EXTRUDE_8_REACH, mode=Mode.PRIVATE) & part.part
    add(cut_extrude_8_tool1.solids().sort_by_distance((24, 7.653652, 35))[0], mode=Mode.SUBTRACT)
    add(cut_extrude_8_tool2.solids().sort_by_distance((24, 0, 41.758091))[0], mode=Mode.SUBTRACT)
    add(cut_extrude_8_tool3.solids().sort_by_distance((24, 0, 28.241909))[0], mode=Mode.SUBTRACT)
    add(cut_extrude_8_tool4.solids().sort_by_distance((24, -7.653652, 35))[0], mode=Mode.SUBTRACT)
    add(cut_extrude_8_tool5.solids().sort_by_distance((24, 7.653652, 35))[0], mode=Mode.SUBTRACT)
    add(cut_extrude_8_tool6.solids().sort_by_distance((24, 0, 41.758091))[0], mode=Mode.SUBTRACT)
    add(cut_extrude_8_tool7.solids().sort_by_distance((24, 0, 28.241909))[0], mode=Mode.SUBTRACT)
    add(cut_extrude_8_tool8.solids().sort_by_distance((24, -7.653652, 35))[0], mode=Mode.SUBTRACT)
    add(cut_extrude_8_tool9.solids().sort_by_distance((24, 7.653652, 35))[0], mode=Mode.SUBTRACT)
    add(cut_extrude_8_tool10.solids().sort_by_distance((24, 0, 41.758091))[0], mode=Mode.SUBTRACT)
    add(cut_extrude_8_tool11.solids().sort_by_distance((24, 0, 28.241909))[0], mode=Mode.SUBTRACT)
    add(cut_extrude_8_tool12.solids().sort_by_distance((24, -7.653652, 35))[0], mode=Mode.SUBTRACT)
    add(cut_extrude_8_tool13.solids().sort_by_distance((24, 7.653652, 35))[0], mode=Mode.SUBTRACT)
    add(cut_extrude_8_tool14.solids().sort_by_distance((24, 0, 41.758091))[0], mode=Mode.SUBTRACT)
    add(cut_extrude_8_tool15.solids().sort_by_distance((24, 0, 28.241909))[0], mode=Mode.SUBTRACT)
    add(cut_extrude_8_tool16.solids().sort_by_distance((24, -7.653652, 35))[0], mode=Mode.SUBTRACT)

    # Эскиз16 → Вырез-Вытянуть9 (cut)
    with BuildSketch(Plane.XY.offset(10)):
        with Locations((-0.5, -31)):
            Circle(SKETCH_16_R)
        with Locations((-122.5, -31)):
            Circle(SKETCH_16_R)
        with Locations((-0.5, 31)):
            Circle(SKETCH_16_R)
        with Locations((-122.5, 31)):
            Circle(SKETCH_16_R)
    extrude(amount=-CUT_EXTRUDE_9_DEPTH, mode=Mode.SUBTRACT)

    # Эскиз2<7> → Вырез-Вытянуть10 (cut)
    with BuildSketch(Plane.XY.offset(60)):
        with Locations((74, -47)):
            Rectangle(SKETCH_2_7_W, SKETCH_2_7_H)
        with Locations((-51.5, -47)):
            Rectangle(SKETCH_2_7_W_2, SKETCH_2_7_H)
        with Locations((-51.5, 47)):
            Rectangle(SKETCH_2_7_W_2, SKETCH_2_7_H)
        with Locations((74, 47)):
            Rectangle(SKETCH_2_7_W, SKETCH_2_7_H)
    extrude(amount=-CUT_EXTRUDE_10_DEPTH, mode=Mode.SUBTRACT)

    # Скругление6
    fillet_6_edges = [part.edges().sort_by_distance(p)[0] for p in [
        (-124, -40, 35),
    ]]
    fillet(fillet_6_edges, radius=FILLET_6_R)

    # Скругление7
    fillet_7_edges = [part.edges().sort_by_distance(p)[0] for p in [
        (-144, -40, 35),
    ]]
    fillet(fillet_7_edges, radius=FILLET_7_R - 0.0001)  # a hair under: the kernel refuses the full size

    # Скругление8
    fillet_8_edges = [part.edges().sort_by_distance(p)[0] for p in [
        (124, -40, 35),
    ]]
    fillet(fillet_8_edges, radius=FILLET_8_R)

    # Скругление9
    fillet_9_edges = [part.edges().sort_by_distance(p)[0] for p in [
        (144, -40, 35),
    ]]
    fillet(fillet_9_edges, radius=FILLET_9_R - 0.0001)  # a hair under: the kernel refuses the full size

    # Скругление10
    fillet_10_edges = [part.edges().sort_by_distance(p)[0] for p in [
        (124, 40, 35),
    ]]
    fillet(fillet_10_edges, radius=FILLET_10_R)

    # Скругление11
    fillet_11_edges = [part.edges().sort_by_distance(p)[0] for p in [
        (124, -54, 35),
    ]]
    fillet(fillet_11_edges, radius=FILLET_11_R)

    # Скругление12
    fillet_12_edges = [part.edges().sort_by_distance(p)[0] for p in [
        (-124, -54, 35),
    ]]
    fillet(fillet_12_edges, radius=FILLET_12_R)

    # Скругление14
    fillet_14_edges = [part.edges().sort_by_distance(p)[0] for p in [
        (-144, 40, 35),
    ]]
    fillet(fillet_14_edges, radius=FILLET_14_R)
    fillet_14_2_edges = [part.edges().sort_by_distance(p)[0] for p in [
        (-124, 40, 35),
    ]]
    fillet(fillet_14_2_edges, radius=FILLET_14_R - 0.0001)  # a hair under: the kernel refuses the full size

    # Скругление15
    fillet_15_edges = [part.edges().sort_by_distance(p)[0] for p in [
        (-124, 54, 35),
    ]]
    fillet(fillet_15_edges, radius=FILLET_15_R)

    # Скругление16
    fillet_16_edges = [part.edges().sort_by_distance(p)[0] for p in [
        (124, 54, 35),
        (144, 40, 35),
    ]]
    fillet(fillet_16_edges, radius=FILLET_16_R - 0.0001)  # a hair under: the kernel refuses the full size


solid = part.part
